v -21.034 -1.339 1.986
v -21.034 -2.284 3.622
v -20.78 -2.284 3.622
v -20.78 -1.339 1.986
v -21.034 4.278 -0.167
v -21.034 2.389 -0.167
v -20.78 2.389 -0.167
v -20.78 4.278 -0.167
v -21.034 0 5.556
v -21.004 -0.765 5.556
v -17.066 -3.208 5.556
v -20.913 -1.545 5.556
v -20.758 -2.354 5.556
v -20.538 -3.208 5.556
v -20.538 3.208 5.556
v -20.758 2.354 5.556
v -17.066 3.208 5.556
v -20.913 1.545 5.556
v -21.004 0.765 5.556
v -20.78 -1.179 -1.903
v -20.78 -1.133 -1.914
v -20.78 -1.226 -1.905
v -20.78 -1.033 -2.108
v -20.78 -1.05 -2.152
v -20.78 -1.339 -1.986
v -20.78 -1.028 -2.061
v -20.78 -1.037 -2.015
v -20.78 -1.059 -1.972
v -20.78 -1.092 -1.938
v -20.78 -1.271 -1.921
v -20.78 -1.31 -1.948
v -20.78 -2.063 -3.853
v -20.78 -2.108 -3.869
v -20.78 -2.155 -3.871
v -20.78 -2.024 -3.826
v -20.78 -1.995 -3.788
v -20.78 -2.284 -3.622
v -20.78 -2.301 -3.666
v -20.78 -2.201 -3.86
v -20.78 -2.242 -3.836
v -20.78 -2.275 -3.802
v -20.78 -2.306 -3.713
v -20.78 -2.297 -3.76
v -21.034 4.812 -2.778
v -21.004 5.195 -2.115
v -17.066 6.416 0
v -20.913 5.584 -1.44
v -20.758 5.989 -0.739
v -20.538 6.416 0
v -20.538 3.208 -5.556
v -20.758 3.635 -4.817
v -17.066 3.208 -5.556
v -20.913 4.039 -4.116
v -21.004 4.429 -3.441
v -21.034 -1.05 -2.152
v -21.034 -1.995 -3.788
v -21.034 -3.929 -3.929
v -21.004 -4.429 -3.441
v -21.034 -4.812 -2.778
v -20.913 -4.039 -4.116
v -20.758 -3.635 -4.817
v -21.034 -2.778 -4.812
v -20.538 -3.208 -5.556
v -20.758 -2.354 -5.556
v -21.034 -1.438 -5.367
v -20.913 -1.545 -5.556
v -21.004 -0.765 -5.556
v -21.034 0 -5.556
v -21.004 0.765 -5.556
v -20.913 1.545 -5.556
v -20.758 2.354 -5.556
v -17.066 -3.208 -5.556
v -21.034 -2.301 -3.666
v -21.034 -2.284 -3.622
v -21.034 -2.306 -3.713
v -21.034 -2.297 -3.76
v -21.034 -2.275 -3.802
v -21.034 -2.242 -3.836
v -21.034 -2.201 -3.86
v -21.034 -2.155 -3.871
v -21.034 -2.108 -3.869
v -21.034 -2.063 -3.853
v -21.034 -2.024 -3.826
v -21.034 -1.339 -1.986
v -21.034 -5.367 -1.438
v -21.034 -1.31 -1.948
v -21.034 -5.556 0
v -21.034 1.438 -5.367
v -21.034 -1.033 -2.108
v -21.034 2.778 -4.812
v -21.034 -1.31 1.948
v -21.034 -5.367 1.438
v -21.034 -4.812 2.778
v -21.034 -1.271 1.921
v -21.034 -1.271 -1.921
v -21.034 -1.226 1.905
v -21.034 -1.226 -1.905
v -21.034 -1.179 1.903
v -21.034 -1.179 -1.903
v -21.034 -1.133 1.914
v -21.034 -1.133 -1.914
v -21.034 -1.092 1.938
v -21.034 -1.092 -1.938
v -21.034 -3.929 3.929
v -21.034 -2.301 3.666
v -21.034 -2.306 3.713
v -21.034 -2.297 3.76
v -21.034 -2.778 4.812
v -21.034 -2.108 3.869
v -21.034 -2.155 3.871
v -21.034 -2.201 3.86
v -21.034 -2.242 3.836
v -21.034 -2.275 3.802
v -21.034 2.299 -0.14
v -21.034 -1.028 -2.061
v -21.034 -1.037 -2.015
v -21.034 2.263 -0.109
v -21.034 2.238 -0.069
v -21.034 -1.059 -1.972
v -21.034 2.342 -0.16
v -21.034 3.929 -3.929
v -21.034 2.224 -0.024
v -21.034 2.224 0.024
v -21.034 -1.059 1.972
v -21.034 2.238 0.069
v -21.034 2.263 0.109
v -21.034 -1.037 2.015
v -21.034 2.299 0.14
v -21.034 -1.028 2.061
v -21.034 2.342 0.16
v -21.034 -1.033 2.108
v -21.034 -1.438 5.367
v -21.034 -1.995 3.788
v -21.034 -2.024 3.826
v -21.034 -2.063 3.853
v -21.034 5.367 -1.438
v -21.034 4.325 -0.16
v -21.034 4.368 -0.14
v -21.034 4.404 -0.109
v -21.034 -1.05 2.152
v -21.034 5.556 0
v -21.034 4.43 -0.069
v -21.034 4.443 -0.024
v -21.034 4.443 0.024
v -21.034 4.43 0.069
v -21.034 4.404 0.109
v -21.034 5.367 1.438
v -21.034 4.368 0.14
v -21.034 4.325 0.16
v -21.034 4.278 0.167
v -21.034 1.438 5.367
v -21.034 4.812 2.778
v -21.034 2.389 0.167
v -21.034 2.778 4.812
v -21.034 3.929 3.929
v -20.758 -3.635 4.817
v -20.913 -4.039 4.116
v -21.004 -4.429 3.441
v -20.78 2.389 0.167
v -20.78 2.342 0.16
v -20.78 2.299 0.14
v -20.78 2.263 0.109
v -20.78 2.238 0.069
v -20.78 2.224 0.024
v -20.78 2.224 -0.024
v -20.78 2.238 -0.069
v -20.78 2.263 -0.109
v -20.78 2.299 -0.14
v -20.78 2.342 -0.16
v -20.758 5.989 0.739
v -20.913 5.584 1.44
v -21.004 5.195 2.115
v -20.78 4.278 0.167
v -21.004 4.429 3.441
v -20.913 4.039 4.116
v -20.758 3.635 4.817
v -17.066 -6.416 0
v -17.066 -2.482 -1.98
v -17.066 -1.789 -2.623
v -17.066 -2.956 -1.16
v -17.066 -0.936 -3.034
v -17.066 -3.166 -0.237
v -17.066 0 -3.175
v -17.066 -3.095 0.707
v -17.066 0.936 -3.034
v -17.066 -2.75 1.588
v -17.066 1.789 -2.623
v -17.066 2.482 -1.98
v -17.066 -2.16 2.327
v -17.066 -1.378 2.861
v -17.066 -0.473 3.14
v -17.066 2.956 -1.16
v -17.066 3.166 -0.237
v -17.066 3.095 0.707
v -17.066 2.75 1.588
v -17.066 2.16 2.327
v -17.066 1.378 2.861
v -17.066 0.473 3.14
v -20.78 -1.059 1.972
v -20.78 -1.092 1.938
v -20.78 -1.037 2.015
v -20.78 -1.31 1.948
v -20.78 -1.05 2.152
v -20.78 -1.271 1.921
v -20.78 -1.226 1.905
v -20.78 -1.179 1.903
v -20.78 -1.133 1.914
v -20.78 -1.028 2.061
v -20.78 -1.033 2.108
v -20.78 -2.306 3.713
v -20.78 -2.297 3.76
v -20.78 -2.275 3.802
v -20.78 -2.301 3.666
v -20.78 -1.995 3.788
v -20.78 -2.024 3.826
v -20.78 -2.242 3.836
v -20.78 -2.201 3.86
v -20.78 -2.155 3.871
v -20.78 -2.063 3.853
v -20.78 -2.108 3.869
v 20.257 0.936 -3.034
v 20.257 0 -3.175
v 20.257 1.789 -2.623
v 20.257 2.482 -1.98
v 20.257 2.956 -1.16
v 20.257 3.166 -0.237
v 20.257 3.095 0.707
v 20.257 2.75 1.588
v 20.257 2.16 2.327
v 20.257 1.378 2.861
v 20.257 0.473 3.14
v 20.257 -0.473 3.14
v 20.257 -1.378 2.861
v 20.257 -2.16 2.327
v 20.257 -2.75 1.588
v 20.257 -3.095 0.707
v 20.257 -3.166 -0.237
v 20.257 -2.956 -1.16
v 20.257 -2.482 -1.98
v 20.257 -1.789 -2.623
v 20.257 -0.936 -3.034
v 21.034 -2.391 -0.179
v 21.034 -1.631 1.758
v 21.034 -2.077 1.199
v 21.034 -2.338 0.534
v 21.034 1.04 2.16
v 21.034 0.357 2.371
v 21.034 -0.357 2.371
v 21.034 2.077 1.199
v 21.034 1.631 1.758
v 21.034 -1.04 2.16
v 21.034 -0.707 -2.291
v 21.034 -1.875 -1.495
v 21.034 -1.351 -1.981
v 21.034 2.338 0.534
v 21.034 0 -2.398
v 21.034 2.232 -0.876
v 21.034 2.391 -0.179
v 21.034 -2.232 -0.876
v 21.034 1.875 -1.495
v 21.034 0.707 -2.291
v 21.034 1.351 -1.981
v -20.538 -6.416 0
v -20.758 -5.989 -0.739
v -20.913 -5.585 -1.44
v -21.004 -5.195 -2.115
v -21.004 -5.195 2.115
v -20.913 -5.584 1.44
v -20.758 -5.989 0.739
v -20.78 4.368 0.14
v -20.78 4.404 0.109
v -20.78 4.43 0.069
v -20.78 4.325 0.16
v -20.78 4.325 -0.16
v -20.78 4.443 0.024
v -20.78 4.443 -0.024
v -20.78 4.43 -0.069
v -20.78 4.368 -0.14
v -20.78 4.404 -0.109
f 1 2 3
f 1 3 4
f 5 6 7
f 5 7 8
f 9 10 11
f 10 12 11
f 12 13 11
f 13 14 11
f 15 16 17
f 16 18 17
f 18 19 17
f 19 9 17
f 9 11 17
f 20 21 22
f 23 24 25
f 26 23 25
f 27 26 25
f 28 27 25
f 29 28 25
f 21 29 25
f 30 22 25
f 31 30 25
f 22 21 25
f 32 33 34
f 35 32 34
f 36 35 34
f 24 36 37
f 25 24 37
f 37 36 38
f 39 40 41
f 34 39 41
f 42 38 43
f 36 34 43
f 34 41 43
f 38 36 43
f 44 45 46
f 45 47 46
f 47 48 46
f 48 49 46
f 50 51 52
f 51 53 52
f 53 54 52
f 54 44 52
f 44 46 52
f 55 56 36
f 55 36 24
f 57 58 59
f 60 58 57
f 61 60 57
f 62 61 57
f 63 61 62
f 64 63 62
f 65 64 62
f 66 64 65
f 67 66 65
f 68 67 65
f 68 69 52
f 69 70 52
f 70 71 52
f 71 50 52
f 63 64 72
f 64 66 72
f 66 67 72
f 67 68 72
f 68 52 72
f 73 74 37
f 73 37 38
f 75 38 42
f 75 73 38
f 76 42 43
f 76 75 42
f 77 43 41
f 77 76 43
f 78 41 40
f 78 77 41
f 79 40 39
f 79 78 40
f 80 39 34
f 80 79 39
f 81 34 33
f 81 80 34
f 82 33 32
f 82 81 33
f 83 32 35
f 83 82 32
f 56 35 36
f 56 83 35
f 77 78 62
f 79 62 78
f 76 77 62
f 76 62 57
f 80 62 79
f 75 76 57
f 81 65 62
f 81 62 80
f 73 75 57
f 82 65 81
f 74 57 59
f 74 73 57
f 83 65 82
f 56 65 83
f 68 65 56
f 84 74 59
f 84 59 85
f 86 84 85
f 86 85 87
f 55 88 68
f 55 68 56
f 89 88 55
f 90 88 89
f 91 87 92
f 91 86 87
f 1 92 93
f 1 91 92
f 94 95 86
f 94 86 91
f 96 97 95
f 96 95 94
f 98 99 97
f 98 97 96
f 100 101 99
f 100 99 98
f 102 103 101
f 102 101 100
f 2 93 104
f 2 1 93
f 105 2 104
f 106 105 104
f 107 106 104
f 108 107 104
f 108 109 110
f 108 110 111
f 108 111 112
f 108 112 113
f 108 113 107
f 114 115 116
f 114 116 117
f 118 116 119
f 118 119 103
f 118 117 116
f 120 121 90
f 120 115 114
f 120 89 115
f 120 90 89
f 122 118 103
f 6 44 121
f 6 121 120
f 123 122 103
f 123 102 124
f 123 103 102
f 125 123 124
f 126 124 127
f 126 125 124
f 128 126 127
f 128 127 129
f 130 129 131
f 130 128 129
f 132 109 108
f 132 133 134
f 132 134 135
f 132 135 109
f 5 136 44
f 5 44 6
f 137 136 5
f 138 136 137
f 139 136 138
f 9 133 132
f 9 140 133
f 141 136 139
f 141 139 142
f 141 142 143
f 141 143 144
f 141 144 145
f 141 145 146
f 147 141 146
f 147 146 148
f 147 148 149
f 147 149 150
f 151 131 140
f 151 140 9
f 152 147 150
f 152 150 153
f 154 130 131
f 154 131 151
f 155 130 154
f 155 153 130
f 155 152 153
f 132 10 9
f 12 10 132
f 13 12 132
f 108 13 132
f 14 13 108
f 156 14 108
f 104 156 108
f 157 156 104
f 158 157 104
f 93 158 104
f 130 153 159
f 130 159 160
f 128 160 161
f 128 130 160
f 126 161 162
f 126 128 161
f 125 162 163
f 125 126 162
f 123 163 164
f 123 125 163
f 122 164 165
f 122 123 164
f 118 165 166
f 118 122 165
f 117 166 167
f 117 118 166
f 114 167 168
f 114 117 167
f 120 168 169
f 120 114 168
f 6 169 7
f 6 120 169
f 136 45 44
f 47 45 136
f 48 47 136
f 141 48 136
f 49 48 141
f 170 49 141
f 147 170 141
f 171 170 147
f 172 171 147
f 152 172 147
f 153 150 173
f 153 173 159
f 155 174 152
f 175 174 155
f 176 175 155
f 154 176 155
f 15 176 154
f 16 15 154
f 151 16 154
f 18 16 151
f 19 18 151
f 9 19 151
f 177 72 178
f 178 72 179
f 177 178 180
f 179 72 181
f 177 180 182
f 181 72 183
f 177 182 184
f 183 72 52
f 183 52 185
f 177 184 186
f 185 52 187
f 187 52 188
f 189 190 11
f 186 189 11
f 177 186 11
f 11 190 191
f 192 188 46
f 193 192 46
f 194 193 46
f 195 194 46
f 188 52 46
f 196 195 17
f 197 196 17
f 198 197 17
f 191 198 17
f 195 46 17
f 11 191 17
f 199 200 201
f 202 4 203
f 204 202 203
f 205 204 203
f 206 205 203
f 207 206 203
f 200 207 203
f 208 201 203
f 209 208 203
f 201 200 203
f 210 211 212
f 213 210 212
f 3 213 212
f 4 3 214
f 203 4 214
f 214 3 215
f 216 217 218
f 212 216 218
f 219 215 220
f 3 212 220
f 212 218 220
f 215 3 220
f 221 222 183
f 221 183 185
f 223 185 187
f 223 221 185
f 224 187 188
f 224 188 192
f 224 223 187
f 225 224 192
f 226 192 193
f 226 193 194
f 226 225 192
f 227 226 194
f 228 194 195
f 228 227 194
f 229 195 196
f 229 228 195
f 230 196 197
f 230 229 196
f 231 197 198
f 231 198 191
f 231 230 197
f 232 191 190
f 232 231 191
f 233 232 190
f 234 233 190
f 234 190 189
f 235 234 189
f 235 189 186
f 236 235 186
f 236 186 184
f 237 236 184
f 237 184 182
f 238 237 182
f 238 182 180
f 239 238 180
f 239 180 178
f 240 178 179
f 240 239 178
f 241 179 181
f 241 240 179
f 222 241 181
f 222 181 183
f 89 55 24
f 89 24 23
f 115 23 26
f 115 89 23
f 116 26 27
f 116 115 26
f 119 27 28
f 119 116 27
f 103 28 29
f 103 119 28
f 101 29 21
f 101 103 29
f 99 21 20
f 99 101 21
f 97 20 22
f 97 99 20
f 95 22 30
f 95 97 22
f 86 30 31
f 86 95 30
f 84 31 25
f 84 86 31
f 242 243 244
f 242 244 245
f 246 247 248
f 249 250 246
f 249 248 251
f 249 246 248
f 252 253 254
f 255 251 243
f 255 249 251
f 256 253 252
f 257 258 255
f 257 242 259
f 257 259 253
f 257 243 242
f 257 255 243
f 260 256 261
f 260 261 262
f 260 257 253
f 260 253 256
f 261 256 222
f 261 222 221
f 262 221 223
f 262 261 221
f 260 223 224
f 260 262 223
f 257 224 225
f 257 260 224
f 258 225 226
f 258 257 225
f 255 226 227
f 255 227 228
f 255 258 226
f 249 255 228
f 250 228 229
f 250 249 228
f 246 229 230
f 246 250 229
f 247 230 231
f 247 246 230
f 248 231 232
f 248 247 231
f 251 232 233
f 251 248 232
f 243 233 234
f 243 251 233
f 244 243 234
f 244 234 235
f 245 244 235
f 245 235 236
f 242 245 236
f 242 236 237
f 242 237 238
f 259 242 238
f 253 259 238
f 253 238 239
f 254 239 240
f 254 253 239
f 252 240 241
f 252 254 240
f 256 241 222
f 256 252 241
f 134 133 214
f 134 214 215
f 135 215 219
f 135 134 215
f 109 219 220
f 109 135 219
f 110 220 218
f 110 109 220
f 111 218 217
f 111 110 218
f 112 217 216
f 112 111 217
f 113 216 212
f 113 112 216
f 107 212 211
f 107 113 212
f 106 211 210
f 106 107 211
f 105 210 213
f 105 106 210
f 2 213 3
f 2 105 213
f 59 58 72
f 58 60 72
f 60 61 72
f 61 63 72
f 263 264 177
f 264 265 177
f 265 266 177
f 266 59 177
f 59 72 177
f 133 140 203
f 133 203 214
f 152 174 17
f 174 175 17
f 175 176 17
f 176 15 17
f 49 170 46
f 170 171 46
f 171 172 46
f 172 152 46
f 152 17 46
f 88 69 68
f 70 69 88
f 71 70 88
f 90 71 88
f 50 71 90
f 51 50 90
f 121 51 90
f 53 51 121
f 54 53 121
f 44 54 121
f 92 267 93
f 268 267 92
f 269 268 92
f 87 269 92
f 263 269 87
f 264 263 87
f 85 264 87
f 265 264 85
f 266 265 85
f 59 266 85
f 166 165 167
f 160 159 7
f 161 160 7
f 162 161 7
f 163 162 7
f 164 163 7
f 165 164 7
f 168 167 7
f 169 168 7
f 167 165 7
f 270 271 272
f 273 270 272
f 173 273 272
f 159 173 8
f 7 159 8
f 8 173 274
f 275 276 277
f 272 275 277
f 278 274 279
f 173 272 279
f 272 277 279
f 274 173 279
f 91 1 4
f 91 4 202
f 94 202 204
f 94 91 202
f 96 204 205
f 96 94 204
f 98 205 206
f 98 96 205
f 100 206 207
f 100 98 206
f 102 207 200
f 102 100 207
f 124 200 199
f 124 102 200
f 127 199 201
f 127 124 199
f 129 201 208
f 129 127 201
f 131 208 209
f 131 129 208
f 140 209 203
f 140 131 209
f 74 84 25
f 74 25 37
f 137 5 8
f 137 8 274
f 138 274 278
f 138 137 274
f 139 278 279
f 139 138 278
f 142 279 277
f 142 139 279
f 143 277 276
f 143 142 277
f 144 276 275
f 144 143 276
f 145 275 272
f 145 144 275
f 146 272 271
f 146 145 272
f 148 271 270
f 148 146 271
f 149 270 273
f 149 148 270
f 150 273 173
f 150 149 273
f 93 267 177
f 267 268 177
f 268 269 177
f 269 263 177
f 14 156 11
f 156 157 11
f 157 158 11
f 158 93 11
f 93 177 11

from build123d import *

# Parameters (mm, degrees)
SKETCH5_R           = 3.175
BOSS_EXTRUDE3_DEPTH = 38.1
CHAMFER1_SIZE       = 0.77724
BOSS_EXTRUDE4_DEPTH = 3.96875
SKETCH8_OUTSIDE_W   = 171.38
SKETCH8_OUTSIDE_H   = 173.1
SKETCH8_OUTSIDE_R   = 5.55625
CUT_EXTRUDE3_DEPTH  = 43.06875
CUT_EXTRUDE3_TAPER  = 60
CUT_EXTRUDE4_DEPTH  = 0.254
CIRPATTERN1_COUNT   = 3


with BuildPart() as part:
    # Sketch5 → Boss-Extrude3 (new body)
    with BuildSketch(Plane(origin=(21.034375, 0, 0), x_dir=(0, 0, -1), z_dir=(1, 0, 0))):
        Circle(SKETCH5_R)
    extrude(amount=-BOSS_EXTRUDE3_DEPTH)

    # Chamfer1
    chamfer1_edges = [part.edges().sort_by_distance(p)[0] for p in [
        (21.034375, 0, 3.175),
    ]]
    chamfer(chamfer1_edges, length=CHAMFER1_SIZE)

    # Sketch6 → Boss-Extrude4 (add)
    with BuildSketch(Plane.ZY.offset(17.065625)):
        Polygon((5.55625, 3.207902433), (0, 6.415804866), (-5.55625, 3.207902433), (-5.55625, -3.207902433), (0, -6.415804866), (5.55625, -3.207902433), align=None)
    extrude(amount=BOSS_EXTRUDE4_DEPTH)

    # Sketch8 outside → Cut-Extrude3 (cut, through all)
    with BuildSketch(Plane.ZY.offset(21.034375)):
        Rectangle(SKETCH8_OUTSIDE_W, SKETCH8_OUTSIDE_H)
        Circle(SKETCH8_OUTSIDE_R, mode=Mode.SUBTRACT)
    extrude(amount=-CUT_EXTRUDE3_DEPTH, taper=CUT_EXTRUDE3_TAPER, mode=Mode.SUBTRACT)

    # Sketch12 → Cut-Extrude4 (cut)
    with BuildSketch(Plane.ZY.offset(21.034375)):
        with BuildLine():
            Line((0.1666875, 4.2783125), (0.1666875, 2.3891875))
            ThreePointArc((0.1666875, 2.3891875), (0, 2.2225), (-0.1666875, 2.3891875))
            Line((-0.1666875, 2.3891875), (-0.1666875, 4.2783125))
            ThreePointArc((-0.1666875, 4.2783125), (0, 4.445), (0.1666875, 4.2783125))
        make_face()
    cut_extrude4 = extrude(amount=-CUT_EXTRUDE4_DEPTH, mode=Mode.SUBTRACT)

    # CirPattern1: Cut-Extrude4 ×3 about axis
    cirpattern1_axis = Axis((0, 0, 0), (1, 0, 0))
    for i in range(1, CIRPATTERN1_COUNT):
        add(cut_extrude4.rotate(cirpattern1_axis, i * 360 / CIRPATTERN1_COUNT), mode=Mode.SUBTRACT)


solid = part.part
